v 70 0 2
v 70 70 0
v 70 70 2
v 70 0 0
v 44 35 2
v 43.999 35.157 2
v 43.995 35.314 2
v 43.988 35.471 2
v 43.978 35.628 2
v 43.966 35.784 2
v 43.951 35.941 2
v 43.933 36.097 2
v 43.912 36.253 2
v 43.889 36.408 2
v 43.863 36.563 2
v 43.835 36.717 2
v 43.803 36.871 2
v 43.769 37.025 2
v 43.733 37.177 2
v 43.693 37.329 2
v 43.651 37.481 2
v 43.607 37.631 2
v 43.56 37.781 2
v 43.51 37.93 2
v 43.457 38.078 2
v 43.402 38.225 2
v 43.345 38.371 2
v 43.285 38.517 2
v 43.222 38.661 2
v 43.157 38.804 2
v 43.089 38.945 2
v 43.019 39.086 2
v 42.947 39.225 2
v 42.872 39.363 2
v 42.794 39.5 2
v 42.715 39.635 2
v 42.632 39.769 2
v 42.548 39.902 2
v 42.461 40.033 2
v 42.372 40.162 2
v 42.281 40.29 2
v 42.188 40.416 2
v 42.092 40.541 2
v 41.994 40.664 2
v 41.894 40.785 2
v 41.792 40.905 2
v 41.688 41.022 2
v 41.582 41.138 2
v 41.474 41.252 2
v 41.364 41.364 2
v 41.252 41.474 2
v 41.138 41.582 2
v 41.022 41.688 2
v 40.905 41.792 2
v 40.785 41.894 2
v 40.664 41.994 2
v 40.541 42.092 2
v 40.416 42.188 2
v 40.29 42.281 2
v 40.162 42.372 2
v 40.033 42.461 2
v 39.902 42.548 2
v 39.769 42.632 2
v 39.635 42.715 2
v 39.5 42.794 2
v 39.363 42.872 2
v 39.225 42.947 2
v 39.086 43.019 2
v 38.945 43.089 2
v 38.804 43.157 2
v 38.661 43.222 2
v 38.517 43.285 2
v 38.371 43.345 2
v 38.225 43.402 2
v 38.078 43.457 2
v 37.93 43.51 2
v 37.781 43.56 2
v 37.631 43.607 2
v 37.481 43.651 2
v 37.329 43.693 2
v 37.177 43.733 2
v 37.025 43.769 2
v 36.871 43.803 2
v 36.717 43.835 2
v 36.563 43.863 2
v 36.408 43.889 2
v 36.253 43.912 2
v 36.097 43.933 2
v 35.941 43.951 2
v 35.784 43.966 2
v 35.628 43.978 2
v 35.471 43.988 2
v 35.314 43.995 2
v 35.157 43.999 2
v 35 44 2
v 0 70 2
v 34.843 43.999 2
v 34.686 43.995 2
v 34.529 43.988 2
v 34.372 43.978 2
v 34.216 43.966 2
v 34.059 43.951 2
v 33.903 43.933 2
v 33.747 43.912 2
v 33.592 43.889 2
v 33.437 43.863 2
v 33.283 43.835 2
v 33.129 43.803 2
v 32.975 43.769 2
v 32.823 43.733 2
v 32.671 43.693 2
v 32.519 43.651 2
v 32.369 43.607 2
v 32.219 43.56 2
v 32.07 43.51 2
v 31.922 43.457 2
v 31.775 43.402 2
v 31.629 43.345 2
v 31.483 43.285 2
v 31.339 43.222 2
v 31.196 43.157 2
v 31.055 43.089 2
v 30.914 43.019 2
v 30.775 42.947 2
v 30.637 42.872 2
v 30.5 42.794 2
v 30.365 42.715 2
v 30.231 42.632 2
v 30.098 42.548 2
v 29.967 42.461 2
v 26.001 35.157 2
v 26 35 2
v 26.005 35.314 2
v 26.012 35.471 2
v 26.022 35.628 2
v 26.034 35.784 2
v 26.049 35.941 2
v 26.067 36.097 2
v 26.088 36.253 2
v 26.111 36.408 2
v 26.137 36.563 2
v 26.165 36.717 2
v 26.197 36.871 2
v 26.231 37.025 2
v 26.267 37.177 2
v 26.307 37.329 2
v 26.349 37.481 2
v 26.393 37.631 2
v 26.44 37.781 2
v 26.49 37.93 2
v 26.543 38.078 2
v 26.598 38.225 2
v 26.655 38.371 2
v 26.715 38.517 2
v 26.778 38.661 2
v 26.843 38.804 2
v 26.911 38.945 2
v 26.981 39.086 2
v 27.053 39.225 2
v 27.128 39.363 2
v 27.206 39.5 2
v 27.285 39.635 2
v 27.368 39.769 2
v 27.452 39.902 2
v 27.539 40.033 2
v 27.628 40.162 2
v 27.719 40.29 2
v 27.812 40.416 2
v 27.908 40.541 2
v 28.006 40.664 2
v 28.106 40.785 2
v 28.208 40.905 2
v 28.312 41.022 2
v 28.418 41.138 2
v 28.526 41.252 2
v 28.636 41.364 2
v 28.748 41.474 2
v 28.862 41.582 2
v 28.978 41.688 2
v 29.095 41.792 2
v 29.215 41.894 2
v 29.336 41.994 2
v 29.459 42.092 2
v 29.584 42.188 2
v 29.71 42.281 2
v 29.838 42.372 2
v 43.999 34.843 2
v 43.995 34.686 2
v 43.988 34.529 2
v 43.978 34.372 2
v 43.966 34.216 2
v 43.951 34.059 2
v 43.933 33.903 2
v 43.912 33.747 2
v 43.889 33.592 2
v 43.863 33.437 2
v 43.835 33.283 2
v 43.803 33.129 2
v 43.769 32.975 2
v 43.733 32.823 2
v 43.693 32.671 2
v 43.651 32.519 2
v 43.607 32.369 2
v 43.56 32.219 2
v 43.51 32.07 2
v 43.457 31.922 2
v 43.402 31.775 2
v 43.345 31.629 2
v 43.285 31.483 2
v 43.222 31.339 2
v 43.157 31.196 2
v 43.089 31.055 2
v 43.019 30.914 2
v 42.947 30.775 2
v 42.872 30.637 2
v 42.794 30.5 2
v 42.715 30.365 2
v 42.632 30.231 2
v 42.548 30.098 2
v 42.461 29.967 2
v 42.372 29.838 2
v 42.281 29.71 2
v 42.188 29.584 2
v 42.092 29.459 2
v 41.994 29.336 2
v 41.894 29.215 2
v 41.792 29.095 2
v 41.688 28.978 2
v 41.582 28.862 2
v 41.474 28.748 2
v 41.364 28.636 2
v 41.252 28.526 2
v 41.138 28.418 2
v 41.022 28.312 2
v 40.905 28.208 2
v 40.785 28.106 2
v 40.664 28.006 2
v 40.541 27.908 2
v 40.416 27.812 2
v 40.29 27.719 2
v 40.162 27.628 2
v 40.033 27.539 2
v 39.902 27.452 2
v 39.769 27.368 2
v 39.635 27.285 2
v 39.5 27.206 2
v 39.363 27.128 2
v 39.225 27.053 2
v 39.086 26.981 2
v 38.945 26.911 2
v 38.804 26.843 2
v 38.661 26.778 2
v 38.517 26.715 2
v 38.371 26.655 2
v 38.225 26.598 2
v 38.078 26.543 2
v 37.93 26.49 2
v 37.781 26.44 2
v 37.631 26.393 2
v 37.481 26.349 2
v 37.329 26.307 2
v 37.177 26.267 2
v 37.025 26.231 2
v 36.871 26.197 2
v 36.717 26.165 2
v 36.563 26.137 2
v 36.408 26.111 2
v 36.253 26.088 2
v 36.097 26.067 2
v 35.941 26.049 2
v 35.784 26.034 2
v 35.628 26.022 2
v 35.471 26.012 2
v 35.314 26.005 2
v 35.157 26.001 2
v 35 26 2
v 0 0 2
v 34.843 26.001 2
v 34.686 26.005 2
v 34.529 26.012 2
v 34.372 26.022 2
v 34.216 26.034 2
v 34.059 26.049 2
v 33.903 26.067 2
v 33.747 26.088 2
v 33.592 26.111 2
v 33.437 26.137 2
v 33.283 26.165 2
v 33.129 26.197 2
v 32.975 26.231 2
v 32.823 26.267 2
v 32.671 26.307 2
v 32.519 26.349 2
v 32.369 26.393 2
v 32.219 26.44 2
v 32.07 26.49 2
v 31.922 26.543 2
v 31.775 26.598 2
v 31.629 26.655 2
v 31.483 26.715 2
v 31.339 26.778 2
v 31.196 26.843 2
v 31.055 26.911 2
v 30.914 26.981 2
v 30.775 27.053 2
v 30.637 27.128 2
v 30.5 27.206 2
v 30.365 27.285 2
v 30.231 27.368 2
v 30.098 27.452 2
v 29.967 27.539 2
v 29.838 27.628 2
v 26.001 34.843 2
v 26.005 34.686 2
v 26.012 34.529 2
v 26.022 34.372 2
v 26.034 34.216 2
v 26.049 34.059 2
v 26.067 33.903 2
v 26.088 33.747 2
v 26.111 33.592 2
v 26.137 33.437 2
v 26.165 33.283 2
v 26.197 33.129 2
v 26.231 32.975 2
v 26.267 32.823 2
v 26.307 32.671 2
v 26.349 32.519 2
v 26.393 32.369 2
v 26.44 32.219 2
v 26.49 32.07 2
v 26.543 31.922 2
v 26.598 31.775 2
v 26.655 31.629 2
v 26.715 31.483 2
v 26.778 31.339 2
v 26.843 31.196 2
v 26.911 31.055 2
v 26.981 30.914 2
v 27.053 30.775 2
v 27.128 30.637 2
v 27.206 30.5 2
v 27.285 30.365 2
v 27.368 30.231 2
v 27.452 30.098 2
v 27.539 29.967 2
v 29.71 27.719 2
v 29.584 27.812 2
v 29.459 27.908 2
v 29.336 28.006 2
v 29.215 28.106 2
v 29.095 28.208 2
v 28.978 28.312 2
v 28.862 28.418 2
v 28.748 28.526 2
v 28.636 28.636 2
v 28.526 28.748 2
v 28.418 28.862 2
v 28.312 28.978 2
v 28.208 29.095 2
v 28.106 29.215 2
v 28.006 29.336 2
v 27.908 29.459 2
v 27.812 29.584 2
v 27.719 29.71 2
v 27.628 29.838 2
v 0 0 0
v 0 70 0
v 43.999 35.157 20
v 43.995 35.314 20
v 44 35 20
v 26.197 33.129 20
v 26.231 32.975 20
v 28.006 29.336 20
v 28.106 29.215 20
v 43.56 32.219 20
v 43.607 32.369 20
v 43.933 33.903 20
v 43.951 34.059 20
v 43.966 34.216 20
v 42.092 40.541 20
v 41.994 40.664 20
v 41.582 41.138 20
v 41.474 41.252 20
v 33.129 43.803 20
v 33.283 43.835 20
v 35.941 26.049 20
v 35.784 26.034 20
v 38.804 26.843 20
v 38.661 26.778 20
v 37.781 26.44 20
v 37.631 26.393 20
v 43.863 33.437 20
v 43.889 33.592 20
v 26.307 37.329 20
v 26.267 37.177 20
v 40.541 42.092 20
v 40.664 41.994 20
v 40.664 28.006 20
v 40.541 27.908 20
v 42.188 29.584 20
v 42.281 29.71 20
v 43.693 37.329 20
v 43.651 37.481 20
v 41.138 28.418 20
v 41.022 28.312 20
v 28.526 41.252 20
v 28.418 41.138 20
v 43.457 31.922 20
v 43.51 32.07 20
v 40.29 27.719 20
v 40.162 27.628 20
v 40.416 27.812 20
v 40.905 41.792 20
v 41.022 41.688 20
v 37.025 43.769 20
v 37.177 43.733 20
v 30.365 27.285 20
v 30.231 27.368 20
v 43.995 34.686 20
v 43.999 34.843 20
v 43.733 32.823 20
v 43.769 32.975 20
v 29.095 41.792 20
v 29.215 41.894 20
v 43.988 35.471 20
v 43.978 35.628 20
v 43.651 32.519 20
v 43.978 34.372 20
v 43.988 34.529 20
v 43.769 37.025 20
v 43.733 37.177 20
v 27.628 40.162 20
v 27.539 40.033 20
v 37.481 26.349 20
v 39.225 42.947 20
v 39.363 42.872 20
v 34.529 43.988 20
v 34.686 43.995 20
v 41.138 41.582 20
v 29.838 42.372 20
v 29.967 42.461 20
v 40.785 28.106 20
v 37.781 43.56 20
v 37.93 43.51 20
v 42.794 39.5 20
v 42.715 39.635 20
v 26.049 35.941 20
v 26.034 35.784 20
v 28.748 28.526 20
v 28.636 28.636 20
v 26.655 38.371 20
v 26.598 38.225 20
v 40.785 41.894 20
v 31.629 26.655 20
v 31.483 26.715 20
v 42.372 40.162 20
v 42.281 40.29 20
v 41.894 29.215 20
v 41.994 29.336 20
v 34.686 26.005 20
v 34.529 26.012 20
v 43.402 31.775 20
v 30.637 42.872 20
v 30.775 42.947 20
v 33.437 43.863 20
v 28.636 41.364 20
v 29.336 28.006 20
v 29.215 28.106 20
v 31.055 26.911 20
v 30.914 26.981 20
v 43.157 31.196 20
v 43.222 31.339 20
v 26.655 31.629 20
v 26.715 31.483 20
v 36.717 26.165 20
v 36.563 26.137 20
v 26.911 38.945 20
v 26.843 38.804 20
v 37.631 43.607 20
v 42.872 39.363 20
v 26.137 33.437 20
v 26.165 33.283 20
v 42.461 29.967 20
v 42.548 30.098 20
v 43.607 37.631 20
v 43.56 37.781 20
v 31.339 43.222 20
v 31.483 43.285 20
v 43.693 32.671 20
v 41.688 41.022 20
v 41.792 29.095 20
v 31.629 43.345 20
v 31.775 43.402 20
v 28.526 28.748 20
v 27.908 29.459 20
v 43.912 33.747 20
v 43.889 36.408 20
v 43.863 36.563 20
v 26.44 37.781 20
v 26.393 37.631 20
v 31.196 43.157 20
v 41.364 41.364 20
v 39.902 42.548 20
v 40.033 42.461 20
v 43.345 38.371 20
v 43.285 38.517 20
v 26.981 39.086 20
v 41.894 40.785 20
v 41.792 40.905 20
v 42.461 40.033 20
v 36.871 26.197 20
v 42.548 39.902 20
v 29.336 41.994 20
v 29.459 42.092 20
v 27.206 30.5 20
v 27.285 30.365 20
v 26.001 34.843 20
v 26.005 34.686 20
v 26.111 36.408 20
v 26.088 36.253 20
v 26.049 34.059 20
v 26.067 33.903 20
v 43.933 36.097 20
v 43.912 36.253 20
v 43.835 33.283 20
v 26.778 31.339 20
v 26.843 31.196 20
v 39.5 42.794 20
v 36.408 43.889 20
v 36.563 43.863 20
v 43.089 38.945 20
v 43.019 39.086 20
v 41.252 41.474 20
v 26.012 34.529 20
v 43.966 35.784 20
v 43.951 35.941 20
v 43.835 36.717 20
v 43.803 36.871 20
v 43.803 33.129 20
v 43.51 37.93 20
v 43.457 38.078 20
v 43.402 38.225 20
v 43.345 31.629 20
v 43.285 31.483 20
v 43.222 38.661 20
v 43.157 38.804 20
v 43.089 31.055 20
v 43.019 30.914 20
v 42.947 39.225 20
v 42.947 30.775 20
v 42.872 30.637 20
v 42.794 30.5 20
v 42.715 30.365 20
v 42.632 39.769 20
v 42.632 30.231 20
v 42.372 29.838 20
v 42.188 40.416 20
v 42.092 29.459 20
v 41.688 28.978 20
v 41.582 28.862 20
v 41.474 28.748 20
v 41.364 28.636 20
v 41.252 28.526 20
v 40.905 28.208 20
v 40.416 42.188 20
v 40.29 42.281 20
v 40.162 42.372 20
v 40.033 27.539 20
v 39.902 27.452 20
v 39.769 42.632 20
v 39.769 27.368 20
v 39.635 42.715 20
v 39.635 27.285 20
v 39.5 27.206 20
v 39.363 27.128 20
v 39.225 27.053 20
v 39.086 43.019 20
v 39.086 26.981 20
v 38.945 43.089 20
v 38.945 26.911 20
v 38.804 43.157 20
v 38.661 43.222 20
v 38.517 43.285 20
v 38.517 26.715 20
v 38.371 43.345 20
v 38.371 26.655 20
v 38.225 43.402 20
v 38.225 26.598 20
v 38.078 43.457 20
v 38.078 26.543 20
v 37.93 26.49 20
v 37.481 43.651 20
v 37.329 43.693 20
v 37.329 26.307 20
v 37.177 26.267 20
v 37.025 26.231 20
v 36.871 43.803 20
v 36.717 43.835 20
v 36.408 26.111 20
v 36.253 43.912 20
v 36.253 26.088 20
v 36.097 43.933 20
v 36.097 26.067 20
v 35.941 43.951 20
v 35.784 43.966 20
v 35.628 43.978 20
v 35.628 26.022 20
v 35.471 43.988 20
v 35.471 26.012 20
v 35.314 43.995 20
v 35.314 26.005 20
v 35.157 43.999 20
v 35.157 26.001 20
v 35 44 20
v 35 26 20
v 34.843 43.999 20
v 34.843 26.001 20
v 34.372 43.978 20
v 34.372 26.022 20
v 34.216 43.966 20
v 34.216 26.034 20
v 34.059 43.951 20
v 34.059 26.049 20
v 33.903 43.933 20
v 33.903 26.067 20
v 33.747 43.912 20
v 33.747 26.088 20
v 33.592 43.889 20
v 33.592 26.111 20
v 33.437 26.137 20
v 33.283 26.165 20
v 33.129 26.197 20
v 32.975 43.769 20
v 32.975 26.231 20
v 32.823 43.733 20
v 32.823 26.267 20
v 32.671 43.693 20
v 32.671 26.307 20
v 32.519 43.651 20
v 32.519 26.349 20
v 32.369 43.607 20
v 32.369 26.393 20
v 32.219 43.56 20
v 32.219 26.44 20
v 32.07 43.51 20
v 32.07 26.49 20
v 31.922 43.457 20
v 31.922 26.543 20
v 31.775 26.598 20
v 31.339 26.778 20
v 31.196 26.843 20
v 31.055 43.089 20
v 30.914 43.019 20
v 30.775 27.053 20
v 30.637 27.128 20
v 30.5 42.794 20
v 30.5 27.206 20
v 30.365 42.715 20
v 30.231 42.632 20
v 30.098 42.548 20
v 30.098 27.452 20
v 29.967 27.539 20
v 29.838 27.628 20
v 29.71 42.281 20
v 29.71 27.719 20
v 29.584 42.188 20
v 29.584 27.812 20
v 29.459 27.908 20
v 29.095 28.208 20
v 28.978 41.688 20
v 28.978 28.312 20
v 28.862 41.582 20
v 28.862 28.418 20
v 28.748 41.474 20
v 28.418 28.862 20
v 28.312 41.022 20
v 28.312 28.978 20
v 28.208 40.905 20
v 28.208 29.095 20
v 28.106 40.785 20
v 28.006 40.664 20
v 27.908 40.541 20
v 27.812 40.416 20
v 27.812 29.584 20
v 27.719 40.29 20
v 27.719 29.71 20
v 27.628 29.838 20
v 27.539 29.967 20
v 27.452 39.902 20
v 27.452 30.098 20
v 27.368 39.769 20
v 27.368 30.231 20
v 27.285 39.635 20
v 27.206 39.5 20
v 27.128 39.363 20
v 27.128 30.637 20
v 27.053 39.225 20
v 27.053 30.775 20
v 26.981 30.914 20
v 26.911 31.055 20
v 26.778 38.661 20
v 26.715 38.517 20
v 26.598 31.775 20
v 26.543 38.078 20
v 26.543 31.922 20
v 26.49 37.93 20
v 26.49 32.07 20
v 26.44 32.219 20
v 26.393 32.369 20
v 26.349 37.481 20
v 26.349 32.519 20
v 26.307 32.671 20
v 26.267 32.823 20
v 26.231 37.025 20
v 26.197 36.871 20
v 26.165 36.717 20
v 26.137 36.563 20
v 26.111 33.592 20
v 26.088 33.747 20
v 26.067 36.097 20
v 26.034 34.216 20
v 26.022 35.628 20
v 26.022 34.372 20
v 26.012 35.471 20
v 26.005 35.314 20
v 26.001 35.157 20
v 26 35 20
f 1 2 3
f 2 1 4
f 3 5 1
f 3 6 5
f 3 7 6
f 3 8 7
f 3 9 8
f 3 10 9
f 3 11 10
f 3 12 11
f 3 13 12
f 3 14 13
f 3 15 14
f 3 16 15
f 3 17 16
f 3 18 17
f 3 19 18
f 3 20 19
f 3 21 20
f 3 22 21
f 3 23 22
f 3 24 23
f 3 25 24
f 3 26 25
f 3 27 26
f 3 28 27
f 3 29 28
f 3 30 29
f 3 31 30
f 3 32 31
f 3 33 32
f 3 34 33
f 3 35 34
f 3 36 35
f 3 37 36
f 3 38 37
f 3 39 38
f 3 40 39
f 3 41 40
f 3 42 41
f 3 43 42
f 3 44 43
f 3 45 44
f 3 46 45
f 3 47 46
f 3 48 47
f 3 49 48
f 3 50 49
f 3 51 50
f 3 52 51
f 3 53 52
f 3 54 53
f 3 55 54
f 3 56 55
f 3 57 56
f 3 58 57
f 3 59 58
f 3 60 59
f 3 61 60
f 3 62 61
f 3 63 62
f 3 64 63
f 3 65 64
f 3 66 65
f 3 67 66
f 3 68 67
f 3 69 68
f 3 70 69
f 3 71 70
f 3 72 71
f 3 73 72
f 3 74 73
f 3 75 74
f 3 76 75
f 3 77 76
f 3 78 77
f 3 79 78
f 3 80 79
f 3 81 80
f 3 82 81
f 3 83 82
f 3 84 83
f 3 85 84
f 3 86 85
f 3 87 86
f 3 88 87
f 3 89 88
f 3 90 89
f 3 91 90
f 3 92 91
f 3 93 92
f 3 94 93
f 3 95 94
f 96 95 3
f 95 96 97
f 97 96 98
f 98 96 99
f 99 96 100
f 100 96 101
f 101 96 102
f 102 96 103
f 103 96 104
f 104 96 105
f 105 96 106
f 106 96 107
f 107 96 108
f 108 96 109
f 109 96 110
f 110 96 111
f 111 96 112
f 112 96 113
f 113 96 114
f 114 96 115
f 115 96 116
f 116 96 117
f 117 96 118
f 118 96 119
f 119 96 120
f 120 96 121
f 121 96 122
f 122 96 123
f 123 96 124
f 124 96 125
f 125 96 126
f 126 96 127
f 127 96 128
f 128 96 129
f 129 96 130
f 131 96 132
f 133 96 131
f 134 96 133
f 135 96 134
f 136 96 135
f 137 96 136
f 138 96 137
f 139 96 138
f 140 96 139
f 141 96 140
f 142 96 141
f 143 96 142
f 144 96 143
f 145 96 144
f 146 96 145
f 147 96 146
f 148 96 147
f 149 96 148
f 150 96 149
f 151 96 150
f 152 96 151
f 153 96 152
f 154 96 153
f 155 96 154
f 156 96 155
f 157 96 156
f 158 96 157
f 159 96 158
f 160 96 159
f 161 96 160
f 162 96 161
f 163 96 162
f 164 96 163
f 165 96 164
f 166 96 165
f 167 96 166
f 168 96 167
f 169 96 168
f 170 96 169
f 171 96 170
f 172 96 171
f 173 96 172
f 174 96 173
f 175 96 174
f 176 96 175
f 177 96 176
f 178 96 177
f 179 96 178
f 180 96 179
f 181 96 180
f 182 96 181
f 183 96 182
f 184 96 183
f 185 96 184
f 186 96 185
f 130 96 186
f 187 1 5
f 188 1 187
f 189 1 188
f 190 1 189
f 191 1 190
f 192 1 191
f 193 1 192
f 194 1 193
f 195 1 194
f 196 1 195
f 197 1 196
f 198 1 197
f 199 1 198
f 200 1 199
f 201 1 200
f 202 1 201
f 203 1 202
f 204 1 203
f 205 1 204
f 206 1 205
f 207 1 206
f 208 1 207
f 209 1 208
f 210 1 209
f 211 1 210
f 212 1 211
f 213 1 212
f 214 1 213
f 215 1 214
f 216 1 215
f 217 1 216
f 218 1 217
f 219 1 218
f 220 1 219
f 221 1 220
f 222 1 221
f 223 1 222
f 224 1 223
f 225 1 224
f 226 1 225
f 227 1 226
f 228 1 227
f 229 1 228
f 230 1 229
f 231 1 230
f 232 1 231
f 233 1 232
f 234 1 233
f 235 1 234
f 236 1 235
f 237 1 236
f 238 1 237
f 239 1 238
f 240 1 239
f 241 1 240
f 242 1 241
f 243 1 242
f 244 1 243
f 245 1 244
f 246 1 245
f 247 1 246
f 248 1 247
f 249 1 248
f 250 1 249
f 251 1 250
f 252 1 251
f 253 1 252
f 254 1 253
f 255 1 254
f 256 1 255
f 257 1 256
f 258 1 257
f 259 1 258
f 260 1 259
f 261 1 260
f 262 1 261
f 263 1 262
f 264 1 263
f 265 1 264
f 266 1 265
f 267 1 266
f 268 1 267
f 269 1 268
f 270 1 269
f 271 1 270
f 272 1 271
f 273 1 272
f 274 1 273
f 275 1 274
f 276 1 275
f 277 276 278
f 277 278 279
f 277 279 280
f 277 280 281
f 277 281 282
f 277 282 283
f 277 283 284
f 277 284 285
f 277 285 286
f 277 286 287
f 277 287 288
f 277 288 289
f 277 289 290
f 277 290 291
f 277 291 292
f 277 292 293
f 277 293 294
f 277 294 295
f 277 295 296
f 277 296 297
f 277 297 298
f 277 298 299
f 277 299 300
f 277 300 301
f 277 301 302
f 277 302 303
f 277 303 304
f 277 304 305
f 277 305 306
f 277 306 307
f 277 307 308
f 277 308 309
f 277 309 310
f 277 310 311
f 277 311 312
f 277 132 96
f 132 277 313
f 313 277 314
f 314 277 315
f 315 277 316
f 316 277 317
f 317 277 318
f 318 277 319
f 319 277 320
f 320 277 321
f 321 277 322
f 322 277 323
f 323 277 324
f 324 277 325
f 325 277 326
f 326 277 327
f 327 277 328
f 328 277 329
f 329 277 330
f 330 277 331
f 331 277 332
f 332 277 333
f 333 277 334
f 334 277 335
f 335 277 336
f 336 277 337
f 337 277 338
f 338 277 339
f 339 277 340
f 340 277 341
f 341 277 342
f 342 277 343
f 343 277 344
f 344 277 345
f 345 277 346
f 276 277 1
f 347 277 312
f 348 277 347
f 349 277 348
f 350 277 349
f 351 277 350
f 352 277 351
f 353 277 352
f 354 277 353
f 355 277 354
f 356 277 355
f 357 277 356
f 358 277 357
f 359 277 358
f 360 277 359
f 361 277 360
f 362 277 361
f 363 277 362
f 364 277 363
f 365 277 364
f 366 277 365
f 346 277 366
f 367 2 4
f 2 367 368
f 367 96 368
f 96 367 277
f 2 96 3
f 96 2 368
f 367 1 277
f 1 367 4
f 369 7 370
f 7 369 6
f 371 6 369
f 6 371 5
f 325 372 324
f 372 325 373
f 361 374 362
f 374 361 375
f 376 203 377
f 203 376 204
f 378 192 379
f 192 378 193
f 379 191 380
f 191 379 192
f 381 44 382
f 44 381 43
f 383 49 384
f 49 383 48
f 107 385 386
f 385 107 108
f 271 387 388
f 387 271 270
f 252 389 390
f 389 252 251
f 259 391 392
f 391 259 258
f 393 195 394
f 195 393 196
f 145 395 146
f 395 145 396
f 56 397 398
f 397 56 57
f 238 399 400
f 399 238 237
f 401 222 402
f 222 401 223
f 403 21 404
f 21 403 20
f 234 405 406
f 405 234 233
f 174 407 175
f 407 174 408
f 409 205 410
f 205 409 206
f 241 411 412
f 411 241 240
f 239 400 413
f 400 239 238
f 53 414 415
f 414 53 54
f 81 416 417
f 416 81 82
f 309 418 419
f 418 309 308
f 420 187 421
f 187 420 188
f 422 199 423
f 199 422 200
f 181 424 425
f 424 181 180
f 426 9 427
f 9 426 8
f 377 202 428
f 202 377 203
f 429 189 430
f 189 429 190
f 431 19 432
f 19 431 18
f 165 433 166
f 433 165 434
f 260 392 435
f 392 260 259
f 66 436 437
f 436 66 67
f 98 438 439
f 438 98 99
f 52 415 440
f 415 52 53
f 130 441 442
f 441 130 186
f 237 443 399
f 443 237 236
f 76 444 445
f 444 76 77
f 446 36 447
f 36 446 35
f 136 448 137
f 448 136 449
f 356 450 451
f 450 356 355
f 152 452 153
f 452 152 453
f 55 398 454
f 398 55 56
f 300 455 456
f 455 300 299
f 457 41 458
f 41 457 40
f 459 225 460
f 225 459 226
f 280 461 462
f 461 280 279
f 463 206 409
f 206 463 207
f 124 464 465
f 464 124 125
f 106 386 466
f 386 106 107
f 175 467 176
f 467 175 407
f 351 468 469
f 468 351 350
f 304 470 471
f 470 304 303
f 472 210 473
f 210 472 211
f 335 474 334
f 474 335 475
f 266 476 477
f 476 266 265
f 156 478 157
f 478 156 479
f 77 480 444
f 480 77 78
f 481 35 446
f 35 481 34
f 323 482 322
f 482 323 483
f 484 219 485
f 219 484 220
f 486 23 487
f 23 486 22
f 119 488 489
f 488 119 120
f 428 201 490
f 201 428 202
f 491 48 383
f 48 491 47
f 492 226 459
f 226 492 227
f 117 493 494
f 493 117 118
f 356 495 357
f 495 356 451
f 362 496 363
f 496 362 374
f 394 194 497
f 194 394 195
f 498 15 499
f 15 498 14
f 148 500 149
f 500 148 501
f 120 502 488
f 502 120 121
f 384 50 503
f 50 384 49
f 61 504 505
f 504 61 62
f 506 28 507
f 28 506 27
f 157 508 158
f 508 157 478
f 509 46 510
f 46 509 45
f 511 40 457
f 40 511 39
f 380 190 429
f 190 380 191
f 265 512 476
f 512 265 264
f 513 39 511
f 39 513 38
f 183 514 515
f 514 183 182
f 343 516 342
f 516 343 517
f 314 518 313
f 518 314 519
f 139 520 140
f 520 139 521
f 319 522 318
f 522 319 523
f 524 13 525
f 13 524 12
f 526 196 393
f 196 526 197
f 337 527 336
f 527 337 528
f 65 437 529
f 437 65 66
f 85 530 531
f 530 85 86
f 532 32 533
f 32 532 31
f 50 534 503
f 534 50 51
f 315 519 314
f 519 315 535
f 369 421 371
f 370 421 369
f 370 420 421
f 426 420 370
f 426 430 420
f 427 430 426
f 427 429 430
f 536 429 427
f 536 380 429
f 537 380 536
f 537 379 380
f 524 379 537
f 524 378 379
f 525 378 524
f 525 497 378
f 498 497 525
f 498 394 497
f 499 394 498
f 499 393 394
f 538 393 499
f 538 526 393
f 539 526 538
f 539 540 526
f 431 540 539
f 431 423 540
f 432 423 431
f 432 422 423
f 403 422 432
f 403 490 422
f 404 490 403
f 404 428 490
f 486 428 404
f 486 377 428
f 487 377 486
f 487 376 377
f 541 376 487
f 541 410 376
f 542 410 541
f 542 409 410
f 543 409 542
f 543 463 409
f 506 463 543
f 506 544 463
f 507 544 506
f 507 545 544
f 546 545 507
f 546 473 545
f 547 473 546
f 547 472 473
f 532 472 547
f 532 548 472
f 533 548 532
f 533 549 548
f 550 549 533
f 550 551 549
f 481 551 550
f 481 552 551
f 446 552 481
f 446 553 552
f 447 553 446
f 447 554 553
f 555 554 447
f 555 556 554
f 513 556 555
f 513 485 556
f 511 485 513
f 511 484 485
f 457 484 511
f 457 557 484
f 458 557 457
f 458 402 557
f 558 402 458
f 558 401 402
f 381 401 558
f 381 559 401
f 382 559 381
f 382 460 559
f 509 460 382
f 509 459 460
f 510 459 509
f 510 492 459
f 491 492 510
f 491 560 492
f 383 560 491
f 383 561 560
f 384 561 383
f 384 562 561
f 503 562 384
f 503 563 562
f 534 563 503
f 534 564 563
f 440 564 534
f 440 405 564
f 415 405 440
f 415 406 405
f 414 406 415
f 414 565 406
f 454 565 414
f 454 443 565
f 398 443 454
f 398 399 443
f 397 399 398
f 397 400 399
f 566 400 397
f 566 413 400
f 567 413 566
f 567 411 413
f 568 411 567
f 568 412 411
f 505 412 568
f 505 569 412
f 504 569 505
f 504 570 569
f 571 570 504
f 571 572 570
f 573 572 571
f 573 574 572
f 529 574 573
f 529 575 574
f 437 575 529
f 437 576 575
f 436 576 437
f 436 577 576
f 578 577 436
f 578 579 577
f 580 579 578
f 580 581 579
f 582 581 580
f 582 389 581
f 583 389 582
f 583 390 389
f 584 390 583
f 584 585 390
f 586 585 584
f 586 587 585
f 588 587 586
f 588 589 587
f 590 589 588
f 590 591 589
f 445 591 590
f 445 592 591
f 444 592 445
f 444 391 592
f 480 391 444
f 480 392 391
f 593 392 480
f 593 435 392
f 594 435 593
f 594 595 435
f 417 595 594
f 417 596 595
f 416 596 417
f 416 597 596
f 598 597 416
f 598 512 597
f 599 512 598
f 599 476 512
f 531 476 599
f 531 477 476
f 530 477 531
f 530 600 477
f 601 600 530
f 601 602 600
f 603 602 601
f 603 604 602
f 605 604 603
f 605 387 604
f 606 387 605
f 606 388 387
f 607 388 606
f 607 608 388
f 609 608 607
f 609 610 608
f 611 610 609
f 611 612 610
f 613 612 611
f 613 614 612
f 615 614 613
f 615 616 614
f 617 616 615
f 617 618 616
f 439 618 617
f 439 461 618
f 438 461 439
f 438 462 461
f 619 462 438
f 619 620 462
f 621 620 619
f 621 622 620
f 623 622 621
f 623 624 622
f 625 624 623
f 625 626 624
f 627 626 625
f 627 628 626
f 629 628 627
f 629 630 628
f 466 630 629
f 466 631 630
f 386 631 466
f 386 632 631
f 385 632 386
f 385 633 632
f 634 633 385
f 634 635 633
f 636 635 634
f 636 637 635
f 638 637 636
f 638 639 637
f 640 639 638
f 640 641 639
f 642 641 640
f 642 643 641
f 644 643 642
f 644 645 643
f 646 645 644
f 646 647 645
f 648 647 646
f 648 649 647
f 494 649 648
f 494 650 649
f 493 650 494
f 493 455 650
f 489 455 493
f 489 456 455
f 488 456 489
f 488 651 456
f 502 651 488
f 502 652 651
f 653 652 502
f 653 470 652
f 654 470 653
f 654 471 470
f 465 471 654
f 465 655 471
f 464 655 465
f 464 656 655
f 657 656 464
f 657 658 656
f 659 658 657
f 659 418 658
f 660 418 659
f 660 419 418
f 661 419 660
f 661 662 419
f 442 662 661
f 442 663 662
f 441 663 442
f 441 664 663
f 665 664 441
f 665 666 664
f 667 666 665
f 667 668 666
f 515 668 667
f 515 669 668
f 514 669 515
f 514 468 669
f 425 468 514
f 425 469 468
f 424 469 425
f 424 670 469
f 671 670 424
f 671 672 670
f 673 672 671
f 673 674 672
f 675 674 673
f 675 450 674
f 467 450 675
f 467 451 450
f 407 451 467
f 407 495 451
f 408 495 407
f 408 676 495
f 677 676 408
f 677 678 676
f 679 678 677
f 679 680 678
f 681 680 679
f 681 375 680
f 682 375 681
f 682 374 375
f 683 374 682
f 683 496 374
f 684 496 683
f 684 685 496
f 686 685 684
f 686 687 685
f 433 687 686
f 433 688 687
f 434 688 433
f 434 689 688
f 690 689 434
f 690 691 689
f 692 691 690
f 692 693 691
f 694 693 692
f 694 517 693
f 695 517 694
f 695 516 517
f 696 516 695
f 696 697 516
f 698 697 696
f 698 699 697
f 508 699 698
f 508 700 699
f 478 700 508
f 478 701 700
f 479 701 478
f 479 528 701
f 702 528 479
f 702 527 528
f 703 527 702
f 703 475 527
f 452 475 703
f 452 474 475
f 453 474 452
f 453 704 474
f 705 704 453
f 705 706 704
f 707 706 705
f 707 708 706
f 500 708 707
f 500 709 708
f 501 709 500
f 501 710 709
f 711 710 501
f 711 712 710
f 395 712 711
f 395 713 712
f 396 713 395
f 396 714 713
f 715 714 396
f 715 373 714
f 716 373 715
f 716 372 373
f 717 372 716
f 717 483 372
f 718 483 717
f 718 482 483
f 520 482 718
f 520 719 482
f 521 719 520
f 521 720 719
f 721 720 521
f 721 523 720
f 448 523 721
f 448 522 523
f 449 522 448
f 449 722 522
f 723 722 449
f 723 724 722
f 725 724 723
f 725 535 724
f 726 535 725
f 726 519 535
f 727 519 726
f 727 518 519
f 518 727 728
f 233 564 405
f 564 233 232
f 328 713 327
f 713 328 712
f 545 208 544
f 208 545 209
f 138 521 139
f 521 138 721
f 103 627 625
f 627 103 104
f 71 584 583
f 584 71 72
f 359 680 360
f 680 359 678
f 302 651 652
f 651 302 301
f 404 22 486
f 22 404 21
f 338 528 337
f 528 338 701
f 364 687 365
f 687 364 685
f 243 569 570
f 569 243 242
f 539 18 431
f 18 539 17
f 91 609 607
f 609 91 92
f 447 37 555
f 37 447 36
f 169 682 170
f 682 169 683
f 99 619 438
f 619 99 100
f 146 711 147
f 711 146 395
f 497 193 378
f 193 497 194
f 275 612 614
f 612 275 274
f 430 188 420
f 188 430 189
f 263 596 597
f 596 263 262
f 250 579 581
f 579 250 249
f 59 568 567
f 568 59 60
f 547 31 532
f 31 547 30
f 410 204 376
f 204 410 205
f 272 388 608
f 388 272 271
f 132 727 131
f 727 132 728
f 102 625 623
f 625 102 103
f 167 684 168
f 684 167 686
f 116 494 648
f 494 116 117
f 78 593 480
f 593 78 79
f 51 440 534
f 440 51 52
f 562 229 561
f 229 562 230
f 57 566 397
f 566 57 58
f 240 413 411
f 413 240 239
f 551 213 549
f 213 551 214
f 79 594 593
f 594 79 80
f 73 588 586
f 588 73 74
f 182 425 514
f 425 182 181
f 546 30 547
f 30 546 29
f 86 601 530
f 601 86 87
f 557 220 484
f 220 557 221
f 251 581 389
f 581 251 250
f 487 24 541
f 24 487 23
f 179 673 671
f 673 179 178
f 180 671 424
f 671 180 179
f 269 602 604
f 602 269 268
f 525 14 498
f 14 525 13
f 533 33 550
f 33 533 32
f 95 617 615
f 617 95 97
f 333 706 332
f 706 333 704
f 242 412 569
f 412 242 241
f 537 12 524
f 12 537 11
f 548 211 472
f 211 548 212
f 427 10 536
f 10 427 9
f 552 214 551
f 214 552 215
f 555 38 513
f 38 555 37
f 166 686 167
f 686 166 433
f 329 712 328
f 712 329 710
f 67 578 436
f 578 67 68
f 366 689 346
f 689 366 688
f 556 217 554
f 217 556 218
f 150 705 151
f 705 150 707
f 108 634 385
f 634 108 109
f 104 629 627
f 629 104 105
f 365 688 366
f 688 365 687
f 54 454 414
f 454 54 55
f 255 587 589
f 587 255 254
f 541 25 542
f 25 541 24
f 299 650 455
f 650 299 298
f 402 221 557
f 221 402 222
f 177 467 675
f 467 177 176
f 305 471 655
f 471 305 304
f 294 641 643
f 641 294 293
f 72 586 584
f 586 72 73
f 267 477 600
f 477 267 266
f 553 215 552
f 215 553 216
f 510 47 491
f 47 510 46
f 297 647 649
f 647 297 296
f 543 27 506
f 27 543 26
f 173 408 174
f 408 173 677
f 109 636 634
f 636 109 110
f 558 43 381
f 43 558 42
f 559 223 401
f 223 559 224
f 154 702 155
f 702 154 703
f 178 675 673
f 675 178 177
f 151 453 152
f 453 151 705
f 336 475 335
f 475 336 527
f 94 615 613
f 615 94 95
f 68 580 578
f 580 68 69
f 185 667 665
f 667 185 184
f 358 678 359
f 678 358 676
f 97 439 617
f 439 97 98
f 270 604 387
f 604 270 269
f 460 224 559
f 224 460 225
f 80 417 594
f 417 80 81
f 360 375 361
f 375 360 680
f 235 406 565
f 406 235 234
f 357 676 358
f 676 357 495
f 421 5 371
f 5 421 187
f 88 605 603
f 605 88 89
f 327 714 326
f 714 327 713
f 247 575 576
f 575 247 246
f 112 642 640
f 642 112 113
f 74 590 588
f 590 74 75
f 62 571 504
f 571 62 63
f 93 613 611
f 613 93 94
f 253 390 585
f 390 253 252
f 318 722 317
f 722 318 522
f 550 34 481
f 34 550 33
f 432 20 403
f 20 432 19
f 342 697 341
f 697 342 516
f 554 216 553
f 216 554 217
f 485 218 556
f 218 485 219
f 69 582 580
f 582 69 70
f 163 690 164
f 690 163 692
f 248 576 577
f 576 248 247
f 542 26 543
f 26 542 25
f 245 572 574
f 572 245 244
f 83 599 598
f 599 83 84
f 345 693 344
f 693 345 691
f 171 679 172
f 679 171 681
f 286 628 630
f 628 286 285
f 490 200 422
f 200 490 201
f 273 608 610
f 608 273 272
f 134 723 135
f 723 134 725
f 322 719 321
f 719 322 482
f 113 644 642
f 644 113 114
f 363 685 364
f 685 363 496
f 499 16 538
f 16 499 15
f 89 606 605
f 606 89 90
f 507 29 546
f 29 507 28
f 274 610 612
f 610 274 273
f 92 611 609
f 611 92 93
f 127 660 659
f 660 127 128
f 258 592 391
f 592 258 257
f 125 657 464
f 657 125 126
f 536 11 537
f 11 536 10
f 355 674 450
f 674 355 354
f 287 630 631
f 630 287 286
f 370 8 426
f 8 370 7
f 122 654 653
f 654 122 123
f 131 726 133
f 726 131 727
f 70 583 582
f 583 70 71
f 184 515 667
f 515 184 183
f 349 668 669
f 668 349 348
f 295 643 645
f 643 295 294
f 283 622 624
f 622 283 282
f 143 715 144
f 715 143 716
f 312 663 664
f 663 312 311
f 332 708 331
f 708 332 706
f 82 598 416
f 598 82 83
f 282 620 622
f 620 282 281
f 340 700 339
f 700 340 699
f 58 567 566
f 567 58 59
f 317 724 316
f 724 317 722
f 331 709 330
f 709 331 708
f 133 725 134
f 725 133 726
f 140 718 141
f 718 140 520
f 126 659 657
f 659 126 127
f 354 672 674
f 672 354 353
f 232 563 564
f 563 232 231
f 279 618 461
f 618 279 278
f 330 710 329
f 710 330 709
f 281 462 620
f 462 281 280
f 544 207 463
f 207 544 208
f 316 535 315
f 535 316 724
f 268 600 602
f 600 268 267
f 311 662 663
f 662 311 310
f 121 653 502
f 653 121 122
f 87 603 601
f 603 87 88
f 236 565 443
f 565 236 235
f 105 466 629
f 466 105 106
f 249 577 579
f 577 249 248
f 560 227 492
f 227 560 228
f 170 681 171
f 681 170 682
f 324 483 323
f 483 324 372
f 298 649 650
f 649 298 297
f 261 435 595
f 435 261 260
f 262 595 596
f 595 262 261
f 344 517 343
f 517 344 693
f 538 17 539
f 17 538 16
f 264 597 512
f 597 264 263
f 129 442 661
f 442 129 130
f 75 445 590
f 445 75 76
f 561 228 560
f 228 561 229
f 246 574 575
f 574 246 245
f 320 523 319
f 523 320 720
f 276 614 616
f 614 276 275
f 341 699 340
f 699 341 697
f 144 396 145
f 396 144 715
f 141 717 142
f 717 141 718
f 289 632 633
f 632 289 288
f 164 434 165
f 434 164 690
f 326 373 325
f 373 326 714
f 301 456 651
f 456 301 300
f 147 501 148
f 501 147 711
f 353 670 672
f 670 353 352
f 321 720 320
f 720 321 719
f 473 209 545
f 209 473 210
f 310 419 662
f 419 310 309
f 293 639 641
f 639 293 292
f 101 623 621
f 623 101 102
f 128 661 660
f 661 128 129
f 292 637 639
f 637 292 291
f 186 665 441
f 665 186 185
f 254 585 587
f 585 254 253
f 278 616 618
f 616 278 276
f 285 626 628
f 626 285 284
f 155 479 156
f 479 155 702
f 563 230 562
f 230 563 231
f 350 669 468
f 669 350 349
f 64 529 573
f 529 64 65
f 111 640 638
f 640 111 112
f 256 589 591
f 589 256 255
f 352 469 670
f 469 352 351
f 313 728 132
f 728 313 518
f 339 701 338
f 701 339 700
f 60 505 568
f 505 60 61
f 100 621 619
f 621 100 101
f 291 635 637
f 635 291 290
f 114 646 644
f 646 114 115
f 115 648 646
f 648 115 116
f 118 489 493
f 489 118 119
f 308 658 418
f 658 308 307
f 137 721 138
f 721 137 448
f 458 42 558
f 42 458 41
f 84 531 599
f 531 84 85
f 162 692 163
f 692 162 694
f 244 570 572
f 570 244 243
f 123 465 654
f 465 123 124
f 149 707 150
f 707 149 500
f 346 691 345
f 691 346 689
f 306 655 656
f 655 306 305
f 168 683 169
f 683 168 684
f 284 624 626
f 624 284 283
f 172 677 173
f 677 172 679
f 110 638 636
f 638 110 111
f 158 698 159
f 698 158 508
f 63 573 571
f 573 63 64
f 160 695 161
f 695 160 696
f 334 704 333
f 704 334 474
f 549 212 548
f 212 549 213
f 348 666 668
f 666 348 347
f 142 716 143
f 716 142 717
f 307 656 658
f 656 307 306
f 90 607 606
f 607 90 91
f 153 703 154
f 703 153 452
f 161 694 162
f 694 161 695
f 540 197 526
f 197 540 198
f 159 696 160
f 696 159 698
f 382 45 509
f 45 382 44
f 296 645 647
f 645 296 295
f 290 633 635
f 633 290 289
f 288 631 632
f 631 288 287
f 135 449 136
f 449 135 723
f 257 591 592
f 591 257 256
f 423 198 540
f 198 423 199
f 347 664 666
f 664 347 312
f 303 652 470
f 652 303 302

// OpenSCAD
cube ([70, 70, 2]);

translate ([35, 35, 0]) {
  cylinder (h=20, d=18.0, $fn=360, center=false);
}
